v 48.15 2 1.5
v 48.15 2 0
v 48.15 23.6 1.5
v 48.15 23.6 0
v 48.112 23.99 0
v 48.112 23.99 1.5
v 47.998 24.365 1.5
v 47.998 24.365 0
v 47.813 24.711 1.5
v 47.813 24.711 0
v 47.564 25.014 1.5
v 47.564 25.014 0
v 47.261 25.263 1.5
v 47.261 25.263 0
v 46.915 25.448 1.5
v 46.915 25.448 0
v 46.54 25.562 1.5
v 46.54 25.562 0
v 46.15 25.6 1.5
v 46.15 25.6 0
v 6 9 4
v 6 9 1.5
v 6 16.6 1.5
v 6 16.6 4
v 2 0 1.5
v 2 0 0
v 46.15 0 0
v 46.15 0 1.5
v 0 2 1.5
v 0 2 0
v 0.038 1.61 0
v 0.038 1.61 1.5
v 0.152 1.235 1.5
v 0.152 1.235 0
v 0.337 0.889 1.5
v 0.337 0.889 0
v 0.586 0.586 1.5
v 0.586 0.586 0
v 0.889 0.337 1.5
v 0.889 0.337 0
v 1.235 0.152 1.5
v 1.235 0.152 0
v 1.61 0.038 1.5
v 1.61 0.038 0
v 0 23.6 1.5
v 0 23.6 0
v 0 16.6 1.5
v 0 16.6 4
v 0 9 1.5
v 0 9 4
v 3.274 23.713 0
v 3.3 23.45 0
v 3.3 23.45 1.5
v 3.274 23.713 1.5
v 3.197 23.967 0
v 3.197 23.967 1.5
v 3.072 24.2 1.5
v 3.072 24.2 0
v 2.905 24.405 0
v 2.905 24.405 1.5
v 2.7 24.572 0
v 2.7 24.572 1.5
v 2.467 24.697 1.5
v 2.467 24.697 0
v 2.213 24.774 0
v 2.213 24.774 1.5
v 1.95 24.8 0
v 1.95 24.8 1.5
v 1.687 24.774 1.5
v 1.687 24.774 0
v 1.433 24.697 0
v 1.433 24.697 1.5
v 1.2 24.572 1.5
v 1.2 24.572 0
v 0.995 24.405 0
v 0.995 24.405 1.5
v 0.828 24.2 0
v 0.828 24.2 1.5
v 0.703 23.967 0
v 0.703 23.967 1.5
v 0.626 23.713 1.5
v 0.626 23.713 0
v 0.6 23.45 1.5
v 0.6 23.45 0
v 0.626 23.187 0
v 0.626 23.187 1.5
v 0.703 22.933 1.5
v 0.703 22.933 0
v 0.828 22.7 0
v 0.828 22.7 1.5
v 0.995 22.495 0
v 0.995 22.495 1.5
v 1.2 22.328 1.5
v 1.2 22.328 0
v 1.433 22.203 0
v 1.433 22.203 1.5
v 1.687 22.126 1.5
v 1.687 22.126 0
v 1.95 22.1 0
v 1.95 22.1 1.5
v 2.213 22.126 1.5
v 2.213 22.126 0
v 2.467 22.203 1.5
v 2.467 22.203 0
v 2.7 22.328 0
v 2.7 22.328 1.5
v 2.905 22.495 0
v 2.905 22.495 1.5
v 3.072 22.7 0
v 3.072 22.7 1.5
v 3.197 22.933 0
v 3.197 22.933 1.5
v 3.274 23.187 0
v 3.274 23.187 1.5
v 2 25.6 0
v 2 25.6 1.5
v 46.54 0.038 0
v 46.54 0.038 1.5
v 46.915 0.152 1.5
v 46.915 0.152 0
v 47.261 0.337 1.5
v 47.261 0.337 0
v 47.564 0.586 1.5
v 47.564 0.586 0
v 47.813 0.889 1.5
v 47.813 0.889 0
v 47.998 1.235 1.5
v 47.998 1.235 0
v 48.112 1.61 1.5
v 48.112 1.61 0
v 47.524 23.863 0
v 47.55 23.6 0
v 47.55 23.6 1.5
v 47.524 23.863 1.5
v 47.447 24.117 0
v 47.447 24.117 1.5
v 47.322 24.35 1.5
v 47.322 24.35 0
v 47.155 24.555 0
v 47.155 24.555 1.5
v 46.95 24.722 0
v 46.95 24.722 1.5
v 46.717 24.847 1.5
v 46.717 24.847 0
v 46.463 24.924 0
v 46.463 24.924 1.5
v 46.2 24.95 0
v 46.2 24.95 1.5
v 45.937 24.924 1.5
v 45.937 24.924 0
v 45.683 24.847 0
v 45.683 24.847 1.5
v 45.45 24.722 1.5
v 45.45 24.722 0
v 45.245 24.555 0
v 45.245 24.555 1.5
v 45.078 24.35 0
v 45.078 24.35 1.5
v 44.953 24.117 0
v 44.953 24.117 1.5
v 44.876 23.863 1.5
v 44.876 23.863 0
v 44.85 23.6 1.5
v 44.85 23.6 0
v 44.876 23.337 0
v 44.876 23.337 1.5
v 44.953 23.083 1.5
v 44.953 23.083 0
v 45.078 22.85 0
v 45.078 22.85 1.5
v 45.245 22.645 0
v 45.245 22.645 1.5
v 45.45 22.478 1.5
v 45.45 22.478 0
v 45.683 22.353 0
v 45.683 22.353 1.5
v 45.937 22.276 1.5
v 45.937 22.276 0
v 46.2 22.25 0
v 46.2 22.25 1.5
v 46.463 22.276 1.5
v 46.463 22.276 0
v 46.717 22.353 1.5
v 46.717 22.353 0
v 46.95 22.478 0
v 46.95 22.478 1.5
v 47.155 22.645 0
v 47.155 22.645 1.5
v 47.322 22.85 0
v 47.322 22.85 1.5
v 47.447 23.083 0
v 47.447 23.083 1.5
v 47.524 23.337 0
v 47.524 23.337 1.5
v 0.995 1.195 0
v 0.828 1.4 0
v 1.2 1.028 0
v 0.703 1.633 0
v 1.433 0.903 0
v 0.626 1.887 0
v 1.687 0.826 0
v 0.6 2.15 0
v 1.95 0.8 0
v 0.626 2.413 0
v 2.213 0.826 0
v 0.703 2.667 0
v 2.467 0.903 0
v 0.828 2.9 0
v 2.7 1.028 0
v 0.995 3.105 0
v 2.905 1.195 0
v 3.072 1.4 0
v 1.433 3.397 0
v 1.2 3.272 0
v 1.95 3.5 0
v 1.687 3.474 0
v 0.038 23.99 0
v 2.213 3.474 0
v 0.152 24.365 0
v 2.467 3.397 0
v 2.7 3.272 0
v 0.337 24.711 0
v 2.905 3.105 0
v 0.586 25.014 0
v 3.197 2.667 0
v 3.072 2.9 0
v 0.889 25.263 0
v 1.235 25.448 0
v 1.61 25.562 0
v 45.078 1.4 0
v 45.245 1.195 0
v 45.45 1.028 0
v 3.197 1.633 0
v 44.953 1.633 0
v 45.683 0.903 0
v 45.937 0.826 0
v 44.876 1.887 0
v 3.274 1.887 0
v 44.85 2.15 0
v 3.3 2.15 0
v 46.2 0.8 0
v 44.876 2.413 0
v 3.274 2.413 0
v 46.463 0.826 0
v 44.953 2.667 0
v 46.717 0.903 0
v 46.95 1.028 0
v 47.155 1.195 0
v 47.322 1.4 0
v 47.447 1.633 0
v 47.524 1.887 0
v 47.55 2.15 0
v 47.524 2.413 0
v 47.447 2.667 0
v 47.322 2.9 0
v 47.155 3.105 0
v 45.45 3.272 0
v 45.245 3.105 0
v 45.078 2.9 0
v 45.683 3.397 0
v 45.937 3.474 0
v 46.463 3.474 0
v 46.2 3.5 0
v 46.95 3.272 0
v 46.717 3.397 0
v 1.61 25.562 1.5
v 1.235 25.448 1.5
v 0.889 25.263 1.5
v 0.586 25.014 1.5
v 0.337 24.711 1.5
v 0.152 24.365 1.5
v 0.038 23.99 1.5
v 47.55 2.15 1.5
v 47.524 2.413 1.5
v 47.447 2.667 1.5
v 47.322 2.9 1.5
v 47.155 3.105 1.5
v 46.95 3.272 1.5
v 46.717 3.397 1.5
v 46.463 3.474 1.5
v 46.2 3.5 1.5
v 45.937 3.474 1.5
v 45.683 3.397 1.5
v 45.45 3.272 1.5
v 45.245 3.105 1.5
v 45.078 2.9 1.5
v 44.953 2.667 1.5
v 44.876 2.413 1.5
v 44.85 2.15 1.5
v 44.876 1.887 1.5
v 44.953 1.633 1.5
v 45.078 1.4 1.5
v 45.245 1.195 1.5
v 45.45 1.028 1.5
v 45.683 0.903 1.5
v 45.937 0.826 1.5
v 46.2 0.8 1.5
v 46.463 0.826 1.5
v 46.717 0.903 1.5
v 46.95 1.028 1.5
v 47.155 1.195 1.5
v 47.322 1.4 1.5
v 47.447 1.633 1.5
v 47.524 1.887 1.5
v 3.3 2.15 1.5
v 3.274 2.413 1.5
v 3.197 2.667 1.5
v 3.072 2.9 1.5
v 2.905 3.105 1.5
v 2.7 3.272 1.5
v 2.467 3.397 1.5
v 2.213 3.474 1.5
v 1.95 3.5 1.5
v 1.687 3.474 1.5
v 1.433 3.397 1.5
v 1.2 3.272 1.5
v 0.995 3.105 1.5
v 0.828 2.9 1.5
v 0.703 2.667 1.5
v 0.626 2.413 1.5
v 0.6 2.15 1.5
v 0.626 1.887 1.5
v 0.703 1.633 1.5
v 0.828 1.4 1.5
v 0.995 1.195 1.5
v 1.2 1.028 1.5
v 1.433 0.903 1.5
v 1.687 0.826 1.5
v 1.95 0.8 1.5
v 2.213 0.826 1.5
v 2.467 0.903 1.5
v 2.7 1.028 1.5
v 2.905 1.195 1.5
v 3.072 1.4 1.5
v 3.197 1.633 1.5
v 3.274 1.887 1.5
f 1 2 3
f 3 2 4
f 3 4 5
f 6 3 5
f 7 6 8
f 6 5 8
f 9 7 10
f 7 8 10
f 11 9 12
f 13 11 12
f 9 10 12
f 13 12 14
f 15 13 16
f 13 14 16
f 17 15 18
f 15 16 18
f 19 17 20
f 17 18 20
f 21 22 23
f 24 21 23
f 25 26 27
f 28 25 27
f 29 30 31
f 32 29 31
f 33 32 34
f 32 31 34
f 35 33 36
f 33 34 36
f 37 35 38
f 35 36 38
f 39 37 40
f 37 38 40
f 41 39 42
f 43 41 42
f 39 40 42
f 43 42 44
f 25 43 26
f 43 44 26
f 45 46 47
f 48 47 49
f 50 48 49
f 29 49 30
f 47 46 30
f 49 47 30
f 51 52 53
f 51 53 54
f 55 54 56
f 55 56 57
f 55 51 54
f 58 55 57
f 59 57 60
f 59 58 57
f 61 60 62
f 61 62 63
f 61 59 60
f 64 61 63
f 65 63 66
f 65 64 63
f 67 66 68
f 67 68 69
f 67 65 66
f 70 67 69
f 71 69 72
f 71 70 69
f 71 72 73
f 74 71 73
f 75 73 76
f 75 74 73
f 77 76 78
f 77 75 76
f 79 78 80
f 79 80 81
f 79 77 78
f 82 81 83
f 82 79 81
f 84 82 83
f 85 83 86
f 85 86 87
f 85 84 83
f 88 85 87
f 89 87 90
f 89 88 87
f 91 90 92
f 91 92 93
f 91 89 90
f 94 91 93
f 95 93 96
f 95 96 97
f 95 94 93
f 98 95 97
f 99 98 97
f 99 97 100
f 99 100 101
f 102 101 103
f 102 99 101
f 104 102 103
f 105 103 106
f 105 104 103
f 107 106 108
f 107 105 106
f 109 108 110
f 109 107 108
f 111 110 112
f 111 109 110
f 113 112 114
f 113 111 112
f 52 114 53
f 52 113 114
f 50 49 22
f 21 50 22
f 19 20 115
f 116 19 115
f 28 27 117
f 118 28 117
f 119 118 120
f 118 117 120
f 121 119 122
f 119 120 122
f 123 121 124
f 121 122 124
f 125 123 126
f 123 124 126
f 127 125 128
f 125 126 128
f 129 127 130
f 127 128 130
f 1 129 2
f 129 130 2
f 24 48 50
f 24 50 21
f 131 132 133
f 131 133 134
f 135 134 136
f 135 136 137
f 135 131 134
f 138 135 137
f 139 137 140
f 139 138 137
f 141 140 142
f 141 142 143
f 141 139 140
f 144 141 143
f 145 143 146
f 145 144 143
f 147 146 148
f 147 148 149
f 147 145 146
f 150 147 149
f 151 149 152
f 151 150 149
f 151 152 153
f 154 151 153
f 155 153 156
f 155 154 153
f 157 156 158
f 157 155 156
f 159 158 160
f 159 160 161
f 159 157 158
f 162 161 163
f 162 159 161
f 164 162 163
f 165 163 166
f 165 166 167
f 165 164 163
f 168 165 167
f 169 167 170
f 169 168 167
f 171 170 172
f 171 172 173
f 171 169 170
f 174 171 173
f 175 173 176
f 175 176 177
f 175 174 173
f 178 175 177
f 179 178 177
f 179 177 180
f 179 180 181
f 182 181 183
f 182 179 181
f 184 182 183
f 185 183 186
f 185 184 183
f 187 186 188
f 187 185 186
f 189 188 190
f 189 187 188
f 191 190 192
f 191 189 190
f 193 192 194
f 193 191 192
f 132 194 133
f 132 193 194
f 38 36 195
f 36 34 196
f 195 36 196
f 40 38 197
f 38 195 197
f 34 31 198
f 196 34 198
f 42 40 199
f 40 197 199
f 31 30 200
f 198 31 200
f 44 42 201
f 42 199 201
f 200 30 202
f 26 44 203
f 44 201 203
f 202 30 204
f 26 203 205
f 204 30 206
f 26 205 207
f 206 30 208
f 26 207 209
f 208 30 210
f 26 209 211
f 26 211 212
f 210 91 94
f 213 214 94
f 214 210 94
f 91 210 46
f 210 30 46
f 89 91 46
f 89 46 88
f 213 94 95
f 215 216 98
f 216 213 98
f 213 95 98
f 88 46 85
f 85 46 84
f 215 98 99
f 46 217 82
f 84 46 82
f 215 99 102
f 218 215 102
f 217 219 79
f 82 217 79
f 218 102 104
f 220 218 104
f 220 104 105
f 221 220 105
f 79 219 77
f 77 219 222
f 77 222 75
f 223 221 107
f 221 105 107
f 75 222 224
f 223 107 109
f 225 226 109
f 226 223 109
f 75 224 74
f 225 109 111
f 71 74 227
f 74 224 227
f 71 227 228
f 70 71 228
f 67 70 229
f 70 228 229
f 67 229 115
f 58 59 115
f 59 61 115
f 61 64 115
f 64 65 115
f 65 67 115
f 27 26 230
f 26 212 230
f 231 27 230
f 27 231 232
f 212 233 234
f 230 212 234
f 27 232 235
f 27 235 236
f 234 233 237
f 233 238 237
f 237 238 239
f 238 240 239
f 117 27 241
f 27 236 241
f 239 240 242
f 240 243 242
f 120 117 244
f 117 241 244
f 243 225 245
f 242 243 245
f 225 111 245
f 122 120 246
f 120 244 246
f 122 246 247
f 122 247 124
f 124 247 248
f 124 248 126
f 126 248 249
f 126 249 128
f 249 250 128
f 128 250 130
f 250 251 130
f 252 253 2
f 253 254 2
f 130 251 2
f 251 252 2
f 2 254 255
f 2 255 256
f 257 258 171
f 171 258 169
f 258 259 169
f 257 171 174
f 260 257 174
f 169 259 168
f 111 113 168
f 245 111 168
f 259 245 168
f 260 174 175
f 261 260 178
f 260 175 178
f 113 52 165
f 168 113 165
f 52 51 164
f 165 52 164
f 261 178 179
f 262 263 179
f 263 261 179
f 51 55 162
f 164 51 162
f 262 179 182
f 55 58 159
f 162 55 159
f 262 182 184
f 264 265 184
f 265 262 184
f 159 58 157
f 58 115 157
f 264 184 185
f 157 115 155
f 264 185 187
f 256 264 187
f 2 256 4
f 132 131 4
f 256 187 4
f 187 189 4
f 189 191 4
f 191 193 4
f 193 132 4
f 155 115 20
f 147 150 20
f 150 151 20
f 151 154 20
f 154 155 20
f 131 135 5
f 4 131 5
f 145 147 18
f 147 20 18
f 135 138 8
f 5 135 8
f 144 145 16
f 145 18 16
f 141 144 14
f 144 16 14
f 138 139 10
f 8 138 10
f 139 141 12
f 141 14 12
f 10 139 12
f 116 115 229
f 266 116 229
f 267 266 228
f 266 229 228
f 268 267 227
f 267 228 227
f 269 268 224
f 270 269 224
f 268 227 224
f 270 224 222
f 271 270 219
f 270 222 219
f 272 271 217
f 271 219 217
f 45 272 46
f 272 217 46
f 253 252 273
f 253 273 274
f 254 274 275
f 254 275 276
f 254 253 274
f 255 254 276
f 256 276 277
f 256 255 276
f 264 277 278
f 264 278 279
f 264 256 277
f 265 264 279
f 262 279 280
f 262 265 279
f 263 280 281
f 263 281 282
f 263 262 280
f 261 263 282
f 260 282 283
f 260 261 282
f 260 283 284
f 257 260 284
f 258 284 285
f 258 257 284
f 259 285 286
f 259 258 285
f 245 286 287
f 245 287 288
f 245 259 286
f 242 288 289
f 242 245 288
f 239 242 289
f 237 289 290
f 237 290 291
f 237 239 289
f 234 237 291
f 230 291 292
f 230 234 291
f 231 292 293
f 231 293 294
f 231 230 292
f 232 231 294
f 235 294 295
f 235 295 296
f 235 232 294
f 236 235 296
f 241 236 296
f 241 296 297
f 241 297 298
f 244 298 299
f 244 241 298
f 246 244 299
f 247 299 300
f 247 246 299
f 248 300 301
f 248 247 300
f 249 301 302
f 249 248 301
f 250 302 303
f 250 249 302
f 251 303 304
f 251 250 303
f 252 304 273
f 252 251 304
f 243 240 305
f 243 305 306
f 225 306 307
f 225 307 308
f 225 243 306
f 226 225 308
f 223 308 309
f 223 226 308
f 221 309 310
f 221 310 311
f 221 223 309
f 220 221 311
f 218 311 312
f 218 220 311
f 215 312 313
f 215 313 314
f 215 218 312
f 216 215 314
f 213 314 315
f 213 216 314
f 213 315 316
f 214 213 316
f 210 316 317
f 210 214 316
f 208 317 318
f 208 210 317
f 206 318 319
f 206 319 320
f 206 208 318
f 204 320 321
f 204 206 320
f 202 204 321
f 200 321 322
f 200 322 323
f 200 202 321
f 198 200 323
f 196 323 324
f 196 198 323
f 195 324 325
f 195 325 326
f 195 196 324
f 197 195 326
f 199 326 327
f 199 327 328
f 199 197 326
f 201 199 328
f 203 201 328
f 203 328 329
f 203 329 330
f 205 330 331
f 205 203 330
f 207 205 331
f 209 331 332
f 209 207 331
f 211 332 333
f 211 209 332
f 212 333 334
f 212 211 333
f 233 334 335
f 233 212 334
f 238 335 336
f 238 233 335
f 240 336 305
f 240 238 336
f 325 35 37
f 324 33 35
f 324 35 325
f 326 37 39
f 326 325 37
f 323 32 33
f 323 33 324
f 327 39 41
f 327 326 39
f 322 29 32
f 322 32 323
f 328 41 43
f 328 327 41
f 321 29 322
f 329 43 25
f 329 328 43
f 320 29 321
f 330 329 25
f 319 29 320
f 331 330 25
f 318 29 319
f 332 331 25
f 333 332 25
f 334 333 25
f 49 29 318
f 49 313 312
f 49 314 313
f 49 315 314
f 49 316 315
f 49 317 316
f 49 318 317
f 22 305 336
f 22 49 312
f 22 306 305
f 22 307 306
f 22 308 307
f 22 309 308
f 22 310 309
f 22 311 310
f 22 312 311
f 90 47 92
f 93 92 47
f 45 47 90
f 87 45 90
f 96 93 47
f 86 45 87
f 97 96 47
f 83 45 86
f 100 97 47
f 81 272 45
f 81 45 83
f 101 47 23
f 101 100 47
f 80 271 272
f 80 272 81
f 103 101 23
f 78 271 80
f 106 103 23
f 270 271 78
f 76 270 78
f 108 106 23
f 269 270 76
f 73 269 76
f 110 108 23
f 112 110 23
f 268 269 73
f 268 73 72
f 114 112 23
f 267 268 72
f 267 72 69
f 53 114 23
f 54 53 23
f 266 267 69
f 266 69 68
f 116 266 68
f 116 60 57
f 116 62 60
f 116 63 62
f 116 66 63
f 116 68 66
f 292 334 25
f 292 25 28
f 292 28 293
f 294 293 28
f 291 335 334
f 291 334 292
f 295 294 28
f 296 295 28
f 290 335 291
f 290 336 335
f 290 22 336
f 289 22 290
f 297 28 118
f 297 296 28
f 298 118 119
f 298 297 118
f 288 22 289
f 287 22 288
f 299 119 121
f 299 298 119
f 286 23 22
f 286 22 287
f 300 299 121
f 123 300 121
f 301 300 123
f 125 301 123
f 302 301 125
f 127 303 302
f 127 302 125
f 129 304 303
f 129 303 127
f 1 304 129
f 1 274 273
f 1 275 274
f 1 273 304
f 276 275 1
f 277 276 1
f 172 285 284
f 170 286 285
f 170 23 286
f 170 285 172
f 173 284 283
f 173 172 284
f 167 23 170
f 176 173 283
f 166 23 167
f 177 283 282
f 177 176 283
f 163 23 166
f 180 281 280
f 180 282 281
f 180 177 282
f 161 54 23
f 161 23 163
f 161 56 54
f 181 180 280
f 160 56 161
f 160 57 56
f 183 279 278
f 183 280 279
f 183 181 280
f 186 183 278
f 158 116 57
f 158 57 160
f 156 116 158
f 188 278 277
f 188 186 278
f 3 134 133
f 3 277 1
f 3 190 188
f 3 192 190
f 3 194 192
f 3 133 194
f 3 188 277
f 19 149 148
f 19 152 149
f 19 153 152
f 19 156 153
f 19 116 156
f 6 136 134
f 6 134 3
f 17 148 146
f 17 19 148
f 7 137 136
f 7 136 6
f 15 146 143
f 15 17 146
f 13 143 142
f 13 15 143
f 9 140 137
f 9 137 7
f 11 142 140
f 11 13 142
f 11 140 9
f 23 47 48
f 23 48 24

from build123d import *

# Parameters (mm, degrees)
F0_R     = 1.35
F1_DEPTH = 1.5
F2_W     = 6
F2_H     = 7.6
F3_DEPTH = 2.5


with BuildPart() as f1:
    # F0 (on Top) → F1 (new body)
    with BuildSketch(Plane.XY):
        with BuildLine():
            ThreePointArc((0, 2), (0.585786, 0.585786), (2, 0))
            Line((2, 0), (46.15, 0))
            ThreePointArc((46.15, 0), (47.564214, 0.585786), (48.15, 2))
            Line((48.15, 2), (48.15, 23.6))
            ThreePointArc((48.15, 23.6), (47.564214, 25.014214), (46.15, 25.6))
            Line((46.15, 25.6), (2, 25.6))
            ThreePointArc((2, 25.6), (0.585786, 25.014214), (0, 23.6))
            Line((0, 23.6), (0, 2))
        make_face()
        with Locations((1.95, 2.15)):
            Circle(F0_R, mode=Mode.SUBTRACT)
        with Locations((46.2, 2.15)):
            Circle(F0_R, mode=Mode.SUBTRACT)
        with Locations((1.95, 23.45)):
            Circle(F0_R, mode=Mode.SUBTRACT)
        with Locations((46.2, 23.6)):
            Circle(F0_R, mode=Mode.SUBTRACT)
    extrude(amount=F1_DEPTH)

    # F2 (on face) → F3 (join)
    with BuildSketch(Plane.XY.offset(1.5)):
        with Locations((3, 12.8)):
            Rectangle(F2_W, F2_H)
    extrude(amount=F3_DEPTH)


solid = f1.part
